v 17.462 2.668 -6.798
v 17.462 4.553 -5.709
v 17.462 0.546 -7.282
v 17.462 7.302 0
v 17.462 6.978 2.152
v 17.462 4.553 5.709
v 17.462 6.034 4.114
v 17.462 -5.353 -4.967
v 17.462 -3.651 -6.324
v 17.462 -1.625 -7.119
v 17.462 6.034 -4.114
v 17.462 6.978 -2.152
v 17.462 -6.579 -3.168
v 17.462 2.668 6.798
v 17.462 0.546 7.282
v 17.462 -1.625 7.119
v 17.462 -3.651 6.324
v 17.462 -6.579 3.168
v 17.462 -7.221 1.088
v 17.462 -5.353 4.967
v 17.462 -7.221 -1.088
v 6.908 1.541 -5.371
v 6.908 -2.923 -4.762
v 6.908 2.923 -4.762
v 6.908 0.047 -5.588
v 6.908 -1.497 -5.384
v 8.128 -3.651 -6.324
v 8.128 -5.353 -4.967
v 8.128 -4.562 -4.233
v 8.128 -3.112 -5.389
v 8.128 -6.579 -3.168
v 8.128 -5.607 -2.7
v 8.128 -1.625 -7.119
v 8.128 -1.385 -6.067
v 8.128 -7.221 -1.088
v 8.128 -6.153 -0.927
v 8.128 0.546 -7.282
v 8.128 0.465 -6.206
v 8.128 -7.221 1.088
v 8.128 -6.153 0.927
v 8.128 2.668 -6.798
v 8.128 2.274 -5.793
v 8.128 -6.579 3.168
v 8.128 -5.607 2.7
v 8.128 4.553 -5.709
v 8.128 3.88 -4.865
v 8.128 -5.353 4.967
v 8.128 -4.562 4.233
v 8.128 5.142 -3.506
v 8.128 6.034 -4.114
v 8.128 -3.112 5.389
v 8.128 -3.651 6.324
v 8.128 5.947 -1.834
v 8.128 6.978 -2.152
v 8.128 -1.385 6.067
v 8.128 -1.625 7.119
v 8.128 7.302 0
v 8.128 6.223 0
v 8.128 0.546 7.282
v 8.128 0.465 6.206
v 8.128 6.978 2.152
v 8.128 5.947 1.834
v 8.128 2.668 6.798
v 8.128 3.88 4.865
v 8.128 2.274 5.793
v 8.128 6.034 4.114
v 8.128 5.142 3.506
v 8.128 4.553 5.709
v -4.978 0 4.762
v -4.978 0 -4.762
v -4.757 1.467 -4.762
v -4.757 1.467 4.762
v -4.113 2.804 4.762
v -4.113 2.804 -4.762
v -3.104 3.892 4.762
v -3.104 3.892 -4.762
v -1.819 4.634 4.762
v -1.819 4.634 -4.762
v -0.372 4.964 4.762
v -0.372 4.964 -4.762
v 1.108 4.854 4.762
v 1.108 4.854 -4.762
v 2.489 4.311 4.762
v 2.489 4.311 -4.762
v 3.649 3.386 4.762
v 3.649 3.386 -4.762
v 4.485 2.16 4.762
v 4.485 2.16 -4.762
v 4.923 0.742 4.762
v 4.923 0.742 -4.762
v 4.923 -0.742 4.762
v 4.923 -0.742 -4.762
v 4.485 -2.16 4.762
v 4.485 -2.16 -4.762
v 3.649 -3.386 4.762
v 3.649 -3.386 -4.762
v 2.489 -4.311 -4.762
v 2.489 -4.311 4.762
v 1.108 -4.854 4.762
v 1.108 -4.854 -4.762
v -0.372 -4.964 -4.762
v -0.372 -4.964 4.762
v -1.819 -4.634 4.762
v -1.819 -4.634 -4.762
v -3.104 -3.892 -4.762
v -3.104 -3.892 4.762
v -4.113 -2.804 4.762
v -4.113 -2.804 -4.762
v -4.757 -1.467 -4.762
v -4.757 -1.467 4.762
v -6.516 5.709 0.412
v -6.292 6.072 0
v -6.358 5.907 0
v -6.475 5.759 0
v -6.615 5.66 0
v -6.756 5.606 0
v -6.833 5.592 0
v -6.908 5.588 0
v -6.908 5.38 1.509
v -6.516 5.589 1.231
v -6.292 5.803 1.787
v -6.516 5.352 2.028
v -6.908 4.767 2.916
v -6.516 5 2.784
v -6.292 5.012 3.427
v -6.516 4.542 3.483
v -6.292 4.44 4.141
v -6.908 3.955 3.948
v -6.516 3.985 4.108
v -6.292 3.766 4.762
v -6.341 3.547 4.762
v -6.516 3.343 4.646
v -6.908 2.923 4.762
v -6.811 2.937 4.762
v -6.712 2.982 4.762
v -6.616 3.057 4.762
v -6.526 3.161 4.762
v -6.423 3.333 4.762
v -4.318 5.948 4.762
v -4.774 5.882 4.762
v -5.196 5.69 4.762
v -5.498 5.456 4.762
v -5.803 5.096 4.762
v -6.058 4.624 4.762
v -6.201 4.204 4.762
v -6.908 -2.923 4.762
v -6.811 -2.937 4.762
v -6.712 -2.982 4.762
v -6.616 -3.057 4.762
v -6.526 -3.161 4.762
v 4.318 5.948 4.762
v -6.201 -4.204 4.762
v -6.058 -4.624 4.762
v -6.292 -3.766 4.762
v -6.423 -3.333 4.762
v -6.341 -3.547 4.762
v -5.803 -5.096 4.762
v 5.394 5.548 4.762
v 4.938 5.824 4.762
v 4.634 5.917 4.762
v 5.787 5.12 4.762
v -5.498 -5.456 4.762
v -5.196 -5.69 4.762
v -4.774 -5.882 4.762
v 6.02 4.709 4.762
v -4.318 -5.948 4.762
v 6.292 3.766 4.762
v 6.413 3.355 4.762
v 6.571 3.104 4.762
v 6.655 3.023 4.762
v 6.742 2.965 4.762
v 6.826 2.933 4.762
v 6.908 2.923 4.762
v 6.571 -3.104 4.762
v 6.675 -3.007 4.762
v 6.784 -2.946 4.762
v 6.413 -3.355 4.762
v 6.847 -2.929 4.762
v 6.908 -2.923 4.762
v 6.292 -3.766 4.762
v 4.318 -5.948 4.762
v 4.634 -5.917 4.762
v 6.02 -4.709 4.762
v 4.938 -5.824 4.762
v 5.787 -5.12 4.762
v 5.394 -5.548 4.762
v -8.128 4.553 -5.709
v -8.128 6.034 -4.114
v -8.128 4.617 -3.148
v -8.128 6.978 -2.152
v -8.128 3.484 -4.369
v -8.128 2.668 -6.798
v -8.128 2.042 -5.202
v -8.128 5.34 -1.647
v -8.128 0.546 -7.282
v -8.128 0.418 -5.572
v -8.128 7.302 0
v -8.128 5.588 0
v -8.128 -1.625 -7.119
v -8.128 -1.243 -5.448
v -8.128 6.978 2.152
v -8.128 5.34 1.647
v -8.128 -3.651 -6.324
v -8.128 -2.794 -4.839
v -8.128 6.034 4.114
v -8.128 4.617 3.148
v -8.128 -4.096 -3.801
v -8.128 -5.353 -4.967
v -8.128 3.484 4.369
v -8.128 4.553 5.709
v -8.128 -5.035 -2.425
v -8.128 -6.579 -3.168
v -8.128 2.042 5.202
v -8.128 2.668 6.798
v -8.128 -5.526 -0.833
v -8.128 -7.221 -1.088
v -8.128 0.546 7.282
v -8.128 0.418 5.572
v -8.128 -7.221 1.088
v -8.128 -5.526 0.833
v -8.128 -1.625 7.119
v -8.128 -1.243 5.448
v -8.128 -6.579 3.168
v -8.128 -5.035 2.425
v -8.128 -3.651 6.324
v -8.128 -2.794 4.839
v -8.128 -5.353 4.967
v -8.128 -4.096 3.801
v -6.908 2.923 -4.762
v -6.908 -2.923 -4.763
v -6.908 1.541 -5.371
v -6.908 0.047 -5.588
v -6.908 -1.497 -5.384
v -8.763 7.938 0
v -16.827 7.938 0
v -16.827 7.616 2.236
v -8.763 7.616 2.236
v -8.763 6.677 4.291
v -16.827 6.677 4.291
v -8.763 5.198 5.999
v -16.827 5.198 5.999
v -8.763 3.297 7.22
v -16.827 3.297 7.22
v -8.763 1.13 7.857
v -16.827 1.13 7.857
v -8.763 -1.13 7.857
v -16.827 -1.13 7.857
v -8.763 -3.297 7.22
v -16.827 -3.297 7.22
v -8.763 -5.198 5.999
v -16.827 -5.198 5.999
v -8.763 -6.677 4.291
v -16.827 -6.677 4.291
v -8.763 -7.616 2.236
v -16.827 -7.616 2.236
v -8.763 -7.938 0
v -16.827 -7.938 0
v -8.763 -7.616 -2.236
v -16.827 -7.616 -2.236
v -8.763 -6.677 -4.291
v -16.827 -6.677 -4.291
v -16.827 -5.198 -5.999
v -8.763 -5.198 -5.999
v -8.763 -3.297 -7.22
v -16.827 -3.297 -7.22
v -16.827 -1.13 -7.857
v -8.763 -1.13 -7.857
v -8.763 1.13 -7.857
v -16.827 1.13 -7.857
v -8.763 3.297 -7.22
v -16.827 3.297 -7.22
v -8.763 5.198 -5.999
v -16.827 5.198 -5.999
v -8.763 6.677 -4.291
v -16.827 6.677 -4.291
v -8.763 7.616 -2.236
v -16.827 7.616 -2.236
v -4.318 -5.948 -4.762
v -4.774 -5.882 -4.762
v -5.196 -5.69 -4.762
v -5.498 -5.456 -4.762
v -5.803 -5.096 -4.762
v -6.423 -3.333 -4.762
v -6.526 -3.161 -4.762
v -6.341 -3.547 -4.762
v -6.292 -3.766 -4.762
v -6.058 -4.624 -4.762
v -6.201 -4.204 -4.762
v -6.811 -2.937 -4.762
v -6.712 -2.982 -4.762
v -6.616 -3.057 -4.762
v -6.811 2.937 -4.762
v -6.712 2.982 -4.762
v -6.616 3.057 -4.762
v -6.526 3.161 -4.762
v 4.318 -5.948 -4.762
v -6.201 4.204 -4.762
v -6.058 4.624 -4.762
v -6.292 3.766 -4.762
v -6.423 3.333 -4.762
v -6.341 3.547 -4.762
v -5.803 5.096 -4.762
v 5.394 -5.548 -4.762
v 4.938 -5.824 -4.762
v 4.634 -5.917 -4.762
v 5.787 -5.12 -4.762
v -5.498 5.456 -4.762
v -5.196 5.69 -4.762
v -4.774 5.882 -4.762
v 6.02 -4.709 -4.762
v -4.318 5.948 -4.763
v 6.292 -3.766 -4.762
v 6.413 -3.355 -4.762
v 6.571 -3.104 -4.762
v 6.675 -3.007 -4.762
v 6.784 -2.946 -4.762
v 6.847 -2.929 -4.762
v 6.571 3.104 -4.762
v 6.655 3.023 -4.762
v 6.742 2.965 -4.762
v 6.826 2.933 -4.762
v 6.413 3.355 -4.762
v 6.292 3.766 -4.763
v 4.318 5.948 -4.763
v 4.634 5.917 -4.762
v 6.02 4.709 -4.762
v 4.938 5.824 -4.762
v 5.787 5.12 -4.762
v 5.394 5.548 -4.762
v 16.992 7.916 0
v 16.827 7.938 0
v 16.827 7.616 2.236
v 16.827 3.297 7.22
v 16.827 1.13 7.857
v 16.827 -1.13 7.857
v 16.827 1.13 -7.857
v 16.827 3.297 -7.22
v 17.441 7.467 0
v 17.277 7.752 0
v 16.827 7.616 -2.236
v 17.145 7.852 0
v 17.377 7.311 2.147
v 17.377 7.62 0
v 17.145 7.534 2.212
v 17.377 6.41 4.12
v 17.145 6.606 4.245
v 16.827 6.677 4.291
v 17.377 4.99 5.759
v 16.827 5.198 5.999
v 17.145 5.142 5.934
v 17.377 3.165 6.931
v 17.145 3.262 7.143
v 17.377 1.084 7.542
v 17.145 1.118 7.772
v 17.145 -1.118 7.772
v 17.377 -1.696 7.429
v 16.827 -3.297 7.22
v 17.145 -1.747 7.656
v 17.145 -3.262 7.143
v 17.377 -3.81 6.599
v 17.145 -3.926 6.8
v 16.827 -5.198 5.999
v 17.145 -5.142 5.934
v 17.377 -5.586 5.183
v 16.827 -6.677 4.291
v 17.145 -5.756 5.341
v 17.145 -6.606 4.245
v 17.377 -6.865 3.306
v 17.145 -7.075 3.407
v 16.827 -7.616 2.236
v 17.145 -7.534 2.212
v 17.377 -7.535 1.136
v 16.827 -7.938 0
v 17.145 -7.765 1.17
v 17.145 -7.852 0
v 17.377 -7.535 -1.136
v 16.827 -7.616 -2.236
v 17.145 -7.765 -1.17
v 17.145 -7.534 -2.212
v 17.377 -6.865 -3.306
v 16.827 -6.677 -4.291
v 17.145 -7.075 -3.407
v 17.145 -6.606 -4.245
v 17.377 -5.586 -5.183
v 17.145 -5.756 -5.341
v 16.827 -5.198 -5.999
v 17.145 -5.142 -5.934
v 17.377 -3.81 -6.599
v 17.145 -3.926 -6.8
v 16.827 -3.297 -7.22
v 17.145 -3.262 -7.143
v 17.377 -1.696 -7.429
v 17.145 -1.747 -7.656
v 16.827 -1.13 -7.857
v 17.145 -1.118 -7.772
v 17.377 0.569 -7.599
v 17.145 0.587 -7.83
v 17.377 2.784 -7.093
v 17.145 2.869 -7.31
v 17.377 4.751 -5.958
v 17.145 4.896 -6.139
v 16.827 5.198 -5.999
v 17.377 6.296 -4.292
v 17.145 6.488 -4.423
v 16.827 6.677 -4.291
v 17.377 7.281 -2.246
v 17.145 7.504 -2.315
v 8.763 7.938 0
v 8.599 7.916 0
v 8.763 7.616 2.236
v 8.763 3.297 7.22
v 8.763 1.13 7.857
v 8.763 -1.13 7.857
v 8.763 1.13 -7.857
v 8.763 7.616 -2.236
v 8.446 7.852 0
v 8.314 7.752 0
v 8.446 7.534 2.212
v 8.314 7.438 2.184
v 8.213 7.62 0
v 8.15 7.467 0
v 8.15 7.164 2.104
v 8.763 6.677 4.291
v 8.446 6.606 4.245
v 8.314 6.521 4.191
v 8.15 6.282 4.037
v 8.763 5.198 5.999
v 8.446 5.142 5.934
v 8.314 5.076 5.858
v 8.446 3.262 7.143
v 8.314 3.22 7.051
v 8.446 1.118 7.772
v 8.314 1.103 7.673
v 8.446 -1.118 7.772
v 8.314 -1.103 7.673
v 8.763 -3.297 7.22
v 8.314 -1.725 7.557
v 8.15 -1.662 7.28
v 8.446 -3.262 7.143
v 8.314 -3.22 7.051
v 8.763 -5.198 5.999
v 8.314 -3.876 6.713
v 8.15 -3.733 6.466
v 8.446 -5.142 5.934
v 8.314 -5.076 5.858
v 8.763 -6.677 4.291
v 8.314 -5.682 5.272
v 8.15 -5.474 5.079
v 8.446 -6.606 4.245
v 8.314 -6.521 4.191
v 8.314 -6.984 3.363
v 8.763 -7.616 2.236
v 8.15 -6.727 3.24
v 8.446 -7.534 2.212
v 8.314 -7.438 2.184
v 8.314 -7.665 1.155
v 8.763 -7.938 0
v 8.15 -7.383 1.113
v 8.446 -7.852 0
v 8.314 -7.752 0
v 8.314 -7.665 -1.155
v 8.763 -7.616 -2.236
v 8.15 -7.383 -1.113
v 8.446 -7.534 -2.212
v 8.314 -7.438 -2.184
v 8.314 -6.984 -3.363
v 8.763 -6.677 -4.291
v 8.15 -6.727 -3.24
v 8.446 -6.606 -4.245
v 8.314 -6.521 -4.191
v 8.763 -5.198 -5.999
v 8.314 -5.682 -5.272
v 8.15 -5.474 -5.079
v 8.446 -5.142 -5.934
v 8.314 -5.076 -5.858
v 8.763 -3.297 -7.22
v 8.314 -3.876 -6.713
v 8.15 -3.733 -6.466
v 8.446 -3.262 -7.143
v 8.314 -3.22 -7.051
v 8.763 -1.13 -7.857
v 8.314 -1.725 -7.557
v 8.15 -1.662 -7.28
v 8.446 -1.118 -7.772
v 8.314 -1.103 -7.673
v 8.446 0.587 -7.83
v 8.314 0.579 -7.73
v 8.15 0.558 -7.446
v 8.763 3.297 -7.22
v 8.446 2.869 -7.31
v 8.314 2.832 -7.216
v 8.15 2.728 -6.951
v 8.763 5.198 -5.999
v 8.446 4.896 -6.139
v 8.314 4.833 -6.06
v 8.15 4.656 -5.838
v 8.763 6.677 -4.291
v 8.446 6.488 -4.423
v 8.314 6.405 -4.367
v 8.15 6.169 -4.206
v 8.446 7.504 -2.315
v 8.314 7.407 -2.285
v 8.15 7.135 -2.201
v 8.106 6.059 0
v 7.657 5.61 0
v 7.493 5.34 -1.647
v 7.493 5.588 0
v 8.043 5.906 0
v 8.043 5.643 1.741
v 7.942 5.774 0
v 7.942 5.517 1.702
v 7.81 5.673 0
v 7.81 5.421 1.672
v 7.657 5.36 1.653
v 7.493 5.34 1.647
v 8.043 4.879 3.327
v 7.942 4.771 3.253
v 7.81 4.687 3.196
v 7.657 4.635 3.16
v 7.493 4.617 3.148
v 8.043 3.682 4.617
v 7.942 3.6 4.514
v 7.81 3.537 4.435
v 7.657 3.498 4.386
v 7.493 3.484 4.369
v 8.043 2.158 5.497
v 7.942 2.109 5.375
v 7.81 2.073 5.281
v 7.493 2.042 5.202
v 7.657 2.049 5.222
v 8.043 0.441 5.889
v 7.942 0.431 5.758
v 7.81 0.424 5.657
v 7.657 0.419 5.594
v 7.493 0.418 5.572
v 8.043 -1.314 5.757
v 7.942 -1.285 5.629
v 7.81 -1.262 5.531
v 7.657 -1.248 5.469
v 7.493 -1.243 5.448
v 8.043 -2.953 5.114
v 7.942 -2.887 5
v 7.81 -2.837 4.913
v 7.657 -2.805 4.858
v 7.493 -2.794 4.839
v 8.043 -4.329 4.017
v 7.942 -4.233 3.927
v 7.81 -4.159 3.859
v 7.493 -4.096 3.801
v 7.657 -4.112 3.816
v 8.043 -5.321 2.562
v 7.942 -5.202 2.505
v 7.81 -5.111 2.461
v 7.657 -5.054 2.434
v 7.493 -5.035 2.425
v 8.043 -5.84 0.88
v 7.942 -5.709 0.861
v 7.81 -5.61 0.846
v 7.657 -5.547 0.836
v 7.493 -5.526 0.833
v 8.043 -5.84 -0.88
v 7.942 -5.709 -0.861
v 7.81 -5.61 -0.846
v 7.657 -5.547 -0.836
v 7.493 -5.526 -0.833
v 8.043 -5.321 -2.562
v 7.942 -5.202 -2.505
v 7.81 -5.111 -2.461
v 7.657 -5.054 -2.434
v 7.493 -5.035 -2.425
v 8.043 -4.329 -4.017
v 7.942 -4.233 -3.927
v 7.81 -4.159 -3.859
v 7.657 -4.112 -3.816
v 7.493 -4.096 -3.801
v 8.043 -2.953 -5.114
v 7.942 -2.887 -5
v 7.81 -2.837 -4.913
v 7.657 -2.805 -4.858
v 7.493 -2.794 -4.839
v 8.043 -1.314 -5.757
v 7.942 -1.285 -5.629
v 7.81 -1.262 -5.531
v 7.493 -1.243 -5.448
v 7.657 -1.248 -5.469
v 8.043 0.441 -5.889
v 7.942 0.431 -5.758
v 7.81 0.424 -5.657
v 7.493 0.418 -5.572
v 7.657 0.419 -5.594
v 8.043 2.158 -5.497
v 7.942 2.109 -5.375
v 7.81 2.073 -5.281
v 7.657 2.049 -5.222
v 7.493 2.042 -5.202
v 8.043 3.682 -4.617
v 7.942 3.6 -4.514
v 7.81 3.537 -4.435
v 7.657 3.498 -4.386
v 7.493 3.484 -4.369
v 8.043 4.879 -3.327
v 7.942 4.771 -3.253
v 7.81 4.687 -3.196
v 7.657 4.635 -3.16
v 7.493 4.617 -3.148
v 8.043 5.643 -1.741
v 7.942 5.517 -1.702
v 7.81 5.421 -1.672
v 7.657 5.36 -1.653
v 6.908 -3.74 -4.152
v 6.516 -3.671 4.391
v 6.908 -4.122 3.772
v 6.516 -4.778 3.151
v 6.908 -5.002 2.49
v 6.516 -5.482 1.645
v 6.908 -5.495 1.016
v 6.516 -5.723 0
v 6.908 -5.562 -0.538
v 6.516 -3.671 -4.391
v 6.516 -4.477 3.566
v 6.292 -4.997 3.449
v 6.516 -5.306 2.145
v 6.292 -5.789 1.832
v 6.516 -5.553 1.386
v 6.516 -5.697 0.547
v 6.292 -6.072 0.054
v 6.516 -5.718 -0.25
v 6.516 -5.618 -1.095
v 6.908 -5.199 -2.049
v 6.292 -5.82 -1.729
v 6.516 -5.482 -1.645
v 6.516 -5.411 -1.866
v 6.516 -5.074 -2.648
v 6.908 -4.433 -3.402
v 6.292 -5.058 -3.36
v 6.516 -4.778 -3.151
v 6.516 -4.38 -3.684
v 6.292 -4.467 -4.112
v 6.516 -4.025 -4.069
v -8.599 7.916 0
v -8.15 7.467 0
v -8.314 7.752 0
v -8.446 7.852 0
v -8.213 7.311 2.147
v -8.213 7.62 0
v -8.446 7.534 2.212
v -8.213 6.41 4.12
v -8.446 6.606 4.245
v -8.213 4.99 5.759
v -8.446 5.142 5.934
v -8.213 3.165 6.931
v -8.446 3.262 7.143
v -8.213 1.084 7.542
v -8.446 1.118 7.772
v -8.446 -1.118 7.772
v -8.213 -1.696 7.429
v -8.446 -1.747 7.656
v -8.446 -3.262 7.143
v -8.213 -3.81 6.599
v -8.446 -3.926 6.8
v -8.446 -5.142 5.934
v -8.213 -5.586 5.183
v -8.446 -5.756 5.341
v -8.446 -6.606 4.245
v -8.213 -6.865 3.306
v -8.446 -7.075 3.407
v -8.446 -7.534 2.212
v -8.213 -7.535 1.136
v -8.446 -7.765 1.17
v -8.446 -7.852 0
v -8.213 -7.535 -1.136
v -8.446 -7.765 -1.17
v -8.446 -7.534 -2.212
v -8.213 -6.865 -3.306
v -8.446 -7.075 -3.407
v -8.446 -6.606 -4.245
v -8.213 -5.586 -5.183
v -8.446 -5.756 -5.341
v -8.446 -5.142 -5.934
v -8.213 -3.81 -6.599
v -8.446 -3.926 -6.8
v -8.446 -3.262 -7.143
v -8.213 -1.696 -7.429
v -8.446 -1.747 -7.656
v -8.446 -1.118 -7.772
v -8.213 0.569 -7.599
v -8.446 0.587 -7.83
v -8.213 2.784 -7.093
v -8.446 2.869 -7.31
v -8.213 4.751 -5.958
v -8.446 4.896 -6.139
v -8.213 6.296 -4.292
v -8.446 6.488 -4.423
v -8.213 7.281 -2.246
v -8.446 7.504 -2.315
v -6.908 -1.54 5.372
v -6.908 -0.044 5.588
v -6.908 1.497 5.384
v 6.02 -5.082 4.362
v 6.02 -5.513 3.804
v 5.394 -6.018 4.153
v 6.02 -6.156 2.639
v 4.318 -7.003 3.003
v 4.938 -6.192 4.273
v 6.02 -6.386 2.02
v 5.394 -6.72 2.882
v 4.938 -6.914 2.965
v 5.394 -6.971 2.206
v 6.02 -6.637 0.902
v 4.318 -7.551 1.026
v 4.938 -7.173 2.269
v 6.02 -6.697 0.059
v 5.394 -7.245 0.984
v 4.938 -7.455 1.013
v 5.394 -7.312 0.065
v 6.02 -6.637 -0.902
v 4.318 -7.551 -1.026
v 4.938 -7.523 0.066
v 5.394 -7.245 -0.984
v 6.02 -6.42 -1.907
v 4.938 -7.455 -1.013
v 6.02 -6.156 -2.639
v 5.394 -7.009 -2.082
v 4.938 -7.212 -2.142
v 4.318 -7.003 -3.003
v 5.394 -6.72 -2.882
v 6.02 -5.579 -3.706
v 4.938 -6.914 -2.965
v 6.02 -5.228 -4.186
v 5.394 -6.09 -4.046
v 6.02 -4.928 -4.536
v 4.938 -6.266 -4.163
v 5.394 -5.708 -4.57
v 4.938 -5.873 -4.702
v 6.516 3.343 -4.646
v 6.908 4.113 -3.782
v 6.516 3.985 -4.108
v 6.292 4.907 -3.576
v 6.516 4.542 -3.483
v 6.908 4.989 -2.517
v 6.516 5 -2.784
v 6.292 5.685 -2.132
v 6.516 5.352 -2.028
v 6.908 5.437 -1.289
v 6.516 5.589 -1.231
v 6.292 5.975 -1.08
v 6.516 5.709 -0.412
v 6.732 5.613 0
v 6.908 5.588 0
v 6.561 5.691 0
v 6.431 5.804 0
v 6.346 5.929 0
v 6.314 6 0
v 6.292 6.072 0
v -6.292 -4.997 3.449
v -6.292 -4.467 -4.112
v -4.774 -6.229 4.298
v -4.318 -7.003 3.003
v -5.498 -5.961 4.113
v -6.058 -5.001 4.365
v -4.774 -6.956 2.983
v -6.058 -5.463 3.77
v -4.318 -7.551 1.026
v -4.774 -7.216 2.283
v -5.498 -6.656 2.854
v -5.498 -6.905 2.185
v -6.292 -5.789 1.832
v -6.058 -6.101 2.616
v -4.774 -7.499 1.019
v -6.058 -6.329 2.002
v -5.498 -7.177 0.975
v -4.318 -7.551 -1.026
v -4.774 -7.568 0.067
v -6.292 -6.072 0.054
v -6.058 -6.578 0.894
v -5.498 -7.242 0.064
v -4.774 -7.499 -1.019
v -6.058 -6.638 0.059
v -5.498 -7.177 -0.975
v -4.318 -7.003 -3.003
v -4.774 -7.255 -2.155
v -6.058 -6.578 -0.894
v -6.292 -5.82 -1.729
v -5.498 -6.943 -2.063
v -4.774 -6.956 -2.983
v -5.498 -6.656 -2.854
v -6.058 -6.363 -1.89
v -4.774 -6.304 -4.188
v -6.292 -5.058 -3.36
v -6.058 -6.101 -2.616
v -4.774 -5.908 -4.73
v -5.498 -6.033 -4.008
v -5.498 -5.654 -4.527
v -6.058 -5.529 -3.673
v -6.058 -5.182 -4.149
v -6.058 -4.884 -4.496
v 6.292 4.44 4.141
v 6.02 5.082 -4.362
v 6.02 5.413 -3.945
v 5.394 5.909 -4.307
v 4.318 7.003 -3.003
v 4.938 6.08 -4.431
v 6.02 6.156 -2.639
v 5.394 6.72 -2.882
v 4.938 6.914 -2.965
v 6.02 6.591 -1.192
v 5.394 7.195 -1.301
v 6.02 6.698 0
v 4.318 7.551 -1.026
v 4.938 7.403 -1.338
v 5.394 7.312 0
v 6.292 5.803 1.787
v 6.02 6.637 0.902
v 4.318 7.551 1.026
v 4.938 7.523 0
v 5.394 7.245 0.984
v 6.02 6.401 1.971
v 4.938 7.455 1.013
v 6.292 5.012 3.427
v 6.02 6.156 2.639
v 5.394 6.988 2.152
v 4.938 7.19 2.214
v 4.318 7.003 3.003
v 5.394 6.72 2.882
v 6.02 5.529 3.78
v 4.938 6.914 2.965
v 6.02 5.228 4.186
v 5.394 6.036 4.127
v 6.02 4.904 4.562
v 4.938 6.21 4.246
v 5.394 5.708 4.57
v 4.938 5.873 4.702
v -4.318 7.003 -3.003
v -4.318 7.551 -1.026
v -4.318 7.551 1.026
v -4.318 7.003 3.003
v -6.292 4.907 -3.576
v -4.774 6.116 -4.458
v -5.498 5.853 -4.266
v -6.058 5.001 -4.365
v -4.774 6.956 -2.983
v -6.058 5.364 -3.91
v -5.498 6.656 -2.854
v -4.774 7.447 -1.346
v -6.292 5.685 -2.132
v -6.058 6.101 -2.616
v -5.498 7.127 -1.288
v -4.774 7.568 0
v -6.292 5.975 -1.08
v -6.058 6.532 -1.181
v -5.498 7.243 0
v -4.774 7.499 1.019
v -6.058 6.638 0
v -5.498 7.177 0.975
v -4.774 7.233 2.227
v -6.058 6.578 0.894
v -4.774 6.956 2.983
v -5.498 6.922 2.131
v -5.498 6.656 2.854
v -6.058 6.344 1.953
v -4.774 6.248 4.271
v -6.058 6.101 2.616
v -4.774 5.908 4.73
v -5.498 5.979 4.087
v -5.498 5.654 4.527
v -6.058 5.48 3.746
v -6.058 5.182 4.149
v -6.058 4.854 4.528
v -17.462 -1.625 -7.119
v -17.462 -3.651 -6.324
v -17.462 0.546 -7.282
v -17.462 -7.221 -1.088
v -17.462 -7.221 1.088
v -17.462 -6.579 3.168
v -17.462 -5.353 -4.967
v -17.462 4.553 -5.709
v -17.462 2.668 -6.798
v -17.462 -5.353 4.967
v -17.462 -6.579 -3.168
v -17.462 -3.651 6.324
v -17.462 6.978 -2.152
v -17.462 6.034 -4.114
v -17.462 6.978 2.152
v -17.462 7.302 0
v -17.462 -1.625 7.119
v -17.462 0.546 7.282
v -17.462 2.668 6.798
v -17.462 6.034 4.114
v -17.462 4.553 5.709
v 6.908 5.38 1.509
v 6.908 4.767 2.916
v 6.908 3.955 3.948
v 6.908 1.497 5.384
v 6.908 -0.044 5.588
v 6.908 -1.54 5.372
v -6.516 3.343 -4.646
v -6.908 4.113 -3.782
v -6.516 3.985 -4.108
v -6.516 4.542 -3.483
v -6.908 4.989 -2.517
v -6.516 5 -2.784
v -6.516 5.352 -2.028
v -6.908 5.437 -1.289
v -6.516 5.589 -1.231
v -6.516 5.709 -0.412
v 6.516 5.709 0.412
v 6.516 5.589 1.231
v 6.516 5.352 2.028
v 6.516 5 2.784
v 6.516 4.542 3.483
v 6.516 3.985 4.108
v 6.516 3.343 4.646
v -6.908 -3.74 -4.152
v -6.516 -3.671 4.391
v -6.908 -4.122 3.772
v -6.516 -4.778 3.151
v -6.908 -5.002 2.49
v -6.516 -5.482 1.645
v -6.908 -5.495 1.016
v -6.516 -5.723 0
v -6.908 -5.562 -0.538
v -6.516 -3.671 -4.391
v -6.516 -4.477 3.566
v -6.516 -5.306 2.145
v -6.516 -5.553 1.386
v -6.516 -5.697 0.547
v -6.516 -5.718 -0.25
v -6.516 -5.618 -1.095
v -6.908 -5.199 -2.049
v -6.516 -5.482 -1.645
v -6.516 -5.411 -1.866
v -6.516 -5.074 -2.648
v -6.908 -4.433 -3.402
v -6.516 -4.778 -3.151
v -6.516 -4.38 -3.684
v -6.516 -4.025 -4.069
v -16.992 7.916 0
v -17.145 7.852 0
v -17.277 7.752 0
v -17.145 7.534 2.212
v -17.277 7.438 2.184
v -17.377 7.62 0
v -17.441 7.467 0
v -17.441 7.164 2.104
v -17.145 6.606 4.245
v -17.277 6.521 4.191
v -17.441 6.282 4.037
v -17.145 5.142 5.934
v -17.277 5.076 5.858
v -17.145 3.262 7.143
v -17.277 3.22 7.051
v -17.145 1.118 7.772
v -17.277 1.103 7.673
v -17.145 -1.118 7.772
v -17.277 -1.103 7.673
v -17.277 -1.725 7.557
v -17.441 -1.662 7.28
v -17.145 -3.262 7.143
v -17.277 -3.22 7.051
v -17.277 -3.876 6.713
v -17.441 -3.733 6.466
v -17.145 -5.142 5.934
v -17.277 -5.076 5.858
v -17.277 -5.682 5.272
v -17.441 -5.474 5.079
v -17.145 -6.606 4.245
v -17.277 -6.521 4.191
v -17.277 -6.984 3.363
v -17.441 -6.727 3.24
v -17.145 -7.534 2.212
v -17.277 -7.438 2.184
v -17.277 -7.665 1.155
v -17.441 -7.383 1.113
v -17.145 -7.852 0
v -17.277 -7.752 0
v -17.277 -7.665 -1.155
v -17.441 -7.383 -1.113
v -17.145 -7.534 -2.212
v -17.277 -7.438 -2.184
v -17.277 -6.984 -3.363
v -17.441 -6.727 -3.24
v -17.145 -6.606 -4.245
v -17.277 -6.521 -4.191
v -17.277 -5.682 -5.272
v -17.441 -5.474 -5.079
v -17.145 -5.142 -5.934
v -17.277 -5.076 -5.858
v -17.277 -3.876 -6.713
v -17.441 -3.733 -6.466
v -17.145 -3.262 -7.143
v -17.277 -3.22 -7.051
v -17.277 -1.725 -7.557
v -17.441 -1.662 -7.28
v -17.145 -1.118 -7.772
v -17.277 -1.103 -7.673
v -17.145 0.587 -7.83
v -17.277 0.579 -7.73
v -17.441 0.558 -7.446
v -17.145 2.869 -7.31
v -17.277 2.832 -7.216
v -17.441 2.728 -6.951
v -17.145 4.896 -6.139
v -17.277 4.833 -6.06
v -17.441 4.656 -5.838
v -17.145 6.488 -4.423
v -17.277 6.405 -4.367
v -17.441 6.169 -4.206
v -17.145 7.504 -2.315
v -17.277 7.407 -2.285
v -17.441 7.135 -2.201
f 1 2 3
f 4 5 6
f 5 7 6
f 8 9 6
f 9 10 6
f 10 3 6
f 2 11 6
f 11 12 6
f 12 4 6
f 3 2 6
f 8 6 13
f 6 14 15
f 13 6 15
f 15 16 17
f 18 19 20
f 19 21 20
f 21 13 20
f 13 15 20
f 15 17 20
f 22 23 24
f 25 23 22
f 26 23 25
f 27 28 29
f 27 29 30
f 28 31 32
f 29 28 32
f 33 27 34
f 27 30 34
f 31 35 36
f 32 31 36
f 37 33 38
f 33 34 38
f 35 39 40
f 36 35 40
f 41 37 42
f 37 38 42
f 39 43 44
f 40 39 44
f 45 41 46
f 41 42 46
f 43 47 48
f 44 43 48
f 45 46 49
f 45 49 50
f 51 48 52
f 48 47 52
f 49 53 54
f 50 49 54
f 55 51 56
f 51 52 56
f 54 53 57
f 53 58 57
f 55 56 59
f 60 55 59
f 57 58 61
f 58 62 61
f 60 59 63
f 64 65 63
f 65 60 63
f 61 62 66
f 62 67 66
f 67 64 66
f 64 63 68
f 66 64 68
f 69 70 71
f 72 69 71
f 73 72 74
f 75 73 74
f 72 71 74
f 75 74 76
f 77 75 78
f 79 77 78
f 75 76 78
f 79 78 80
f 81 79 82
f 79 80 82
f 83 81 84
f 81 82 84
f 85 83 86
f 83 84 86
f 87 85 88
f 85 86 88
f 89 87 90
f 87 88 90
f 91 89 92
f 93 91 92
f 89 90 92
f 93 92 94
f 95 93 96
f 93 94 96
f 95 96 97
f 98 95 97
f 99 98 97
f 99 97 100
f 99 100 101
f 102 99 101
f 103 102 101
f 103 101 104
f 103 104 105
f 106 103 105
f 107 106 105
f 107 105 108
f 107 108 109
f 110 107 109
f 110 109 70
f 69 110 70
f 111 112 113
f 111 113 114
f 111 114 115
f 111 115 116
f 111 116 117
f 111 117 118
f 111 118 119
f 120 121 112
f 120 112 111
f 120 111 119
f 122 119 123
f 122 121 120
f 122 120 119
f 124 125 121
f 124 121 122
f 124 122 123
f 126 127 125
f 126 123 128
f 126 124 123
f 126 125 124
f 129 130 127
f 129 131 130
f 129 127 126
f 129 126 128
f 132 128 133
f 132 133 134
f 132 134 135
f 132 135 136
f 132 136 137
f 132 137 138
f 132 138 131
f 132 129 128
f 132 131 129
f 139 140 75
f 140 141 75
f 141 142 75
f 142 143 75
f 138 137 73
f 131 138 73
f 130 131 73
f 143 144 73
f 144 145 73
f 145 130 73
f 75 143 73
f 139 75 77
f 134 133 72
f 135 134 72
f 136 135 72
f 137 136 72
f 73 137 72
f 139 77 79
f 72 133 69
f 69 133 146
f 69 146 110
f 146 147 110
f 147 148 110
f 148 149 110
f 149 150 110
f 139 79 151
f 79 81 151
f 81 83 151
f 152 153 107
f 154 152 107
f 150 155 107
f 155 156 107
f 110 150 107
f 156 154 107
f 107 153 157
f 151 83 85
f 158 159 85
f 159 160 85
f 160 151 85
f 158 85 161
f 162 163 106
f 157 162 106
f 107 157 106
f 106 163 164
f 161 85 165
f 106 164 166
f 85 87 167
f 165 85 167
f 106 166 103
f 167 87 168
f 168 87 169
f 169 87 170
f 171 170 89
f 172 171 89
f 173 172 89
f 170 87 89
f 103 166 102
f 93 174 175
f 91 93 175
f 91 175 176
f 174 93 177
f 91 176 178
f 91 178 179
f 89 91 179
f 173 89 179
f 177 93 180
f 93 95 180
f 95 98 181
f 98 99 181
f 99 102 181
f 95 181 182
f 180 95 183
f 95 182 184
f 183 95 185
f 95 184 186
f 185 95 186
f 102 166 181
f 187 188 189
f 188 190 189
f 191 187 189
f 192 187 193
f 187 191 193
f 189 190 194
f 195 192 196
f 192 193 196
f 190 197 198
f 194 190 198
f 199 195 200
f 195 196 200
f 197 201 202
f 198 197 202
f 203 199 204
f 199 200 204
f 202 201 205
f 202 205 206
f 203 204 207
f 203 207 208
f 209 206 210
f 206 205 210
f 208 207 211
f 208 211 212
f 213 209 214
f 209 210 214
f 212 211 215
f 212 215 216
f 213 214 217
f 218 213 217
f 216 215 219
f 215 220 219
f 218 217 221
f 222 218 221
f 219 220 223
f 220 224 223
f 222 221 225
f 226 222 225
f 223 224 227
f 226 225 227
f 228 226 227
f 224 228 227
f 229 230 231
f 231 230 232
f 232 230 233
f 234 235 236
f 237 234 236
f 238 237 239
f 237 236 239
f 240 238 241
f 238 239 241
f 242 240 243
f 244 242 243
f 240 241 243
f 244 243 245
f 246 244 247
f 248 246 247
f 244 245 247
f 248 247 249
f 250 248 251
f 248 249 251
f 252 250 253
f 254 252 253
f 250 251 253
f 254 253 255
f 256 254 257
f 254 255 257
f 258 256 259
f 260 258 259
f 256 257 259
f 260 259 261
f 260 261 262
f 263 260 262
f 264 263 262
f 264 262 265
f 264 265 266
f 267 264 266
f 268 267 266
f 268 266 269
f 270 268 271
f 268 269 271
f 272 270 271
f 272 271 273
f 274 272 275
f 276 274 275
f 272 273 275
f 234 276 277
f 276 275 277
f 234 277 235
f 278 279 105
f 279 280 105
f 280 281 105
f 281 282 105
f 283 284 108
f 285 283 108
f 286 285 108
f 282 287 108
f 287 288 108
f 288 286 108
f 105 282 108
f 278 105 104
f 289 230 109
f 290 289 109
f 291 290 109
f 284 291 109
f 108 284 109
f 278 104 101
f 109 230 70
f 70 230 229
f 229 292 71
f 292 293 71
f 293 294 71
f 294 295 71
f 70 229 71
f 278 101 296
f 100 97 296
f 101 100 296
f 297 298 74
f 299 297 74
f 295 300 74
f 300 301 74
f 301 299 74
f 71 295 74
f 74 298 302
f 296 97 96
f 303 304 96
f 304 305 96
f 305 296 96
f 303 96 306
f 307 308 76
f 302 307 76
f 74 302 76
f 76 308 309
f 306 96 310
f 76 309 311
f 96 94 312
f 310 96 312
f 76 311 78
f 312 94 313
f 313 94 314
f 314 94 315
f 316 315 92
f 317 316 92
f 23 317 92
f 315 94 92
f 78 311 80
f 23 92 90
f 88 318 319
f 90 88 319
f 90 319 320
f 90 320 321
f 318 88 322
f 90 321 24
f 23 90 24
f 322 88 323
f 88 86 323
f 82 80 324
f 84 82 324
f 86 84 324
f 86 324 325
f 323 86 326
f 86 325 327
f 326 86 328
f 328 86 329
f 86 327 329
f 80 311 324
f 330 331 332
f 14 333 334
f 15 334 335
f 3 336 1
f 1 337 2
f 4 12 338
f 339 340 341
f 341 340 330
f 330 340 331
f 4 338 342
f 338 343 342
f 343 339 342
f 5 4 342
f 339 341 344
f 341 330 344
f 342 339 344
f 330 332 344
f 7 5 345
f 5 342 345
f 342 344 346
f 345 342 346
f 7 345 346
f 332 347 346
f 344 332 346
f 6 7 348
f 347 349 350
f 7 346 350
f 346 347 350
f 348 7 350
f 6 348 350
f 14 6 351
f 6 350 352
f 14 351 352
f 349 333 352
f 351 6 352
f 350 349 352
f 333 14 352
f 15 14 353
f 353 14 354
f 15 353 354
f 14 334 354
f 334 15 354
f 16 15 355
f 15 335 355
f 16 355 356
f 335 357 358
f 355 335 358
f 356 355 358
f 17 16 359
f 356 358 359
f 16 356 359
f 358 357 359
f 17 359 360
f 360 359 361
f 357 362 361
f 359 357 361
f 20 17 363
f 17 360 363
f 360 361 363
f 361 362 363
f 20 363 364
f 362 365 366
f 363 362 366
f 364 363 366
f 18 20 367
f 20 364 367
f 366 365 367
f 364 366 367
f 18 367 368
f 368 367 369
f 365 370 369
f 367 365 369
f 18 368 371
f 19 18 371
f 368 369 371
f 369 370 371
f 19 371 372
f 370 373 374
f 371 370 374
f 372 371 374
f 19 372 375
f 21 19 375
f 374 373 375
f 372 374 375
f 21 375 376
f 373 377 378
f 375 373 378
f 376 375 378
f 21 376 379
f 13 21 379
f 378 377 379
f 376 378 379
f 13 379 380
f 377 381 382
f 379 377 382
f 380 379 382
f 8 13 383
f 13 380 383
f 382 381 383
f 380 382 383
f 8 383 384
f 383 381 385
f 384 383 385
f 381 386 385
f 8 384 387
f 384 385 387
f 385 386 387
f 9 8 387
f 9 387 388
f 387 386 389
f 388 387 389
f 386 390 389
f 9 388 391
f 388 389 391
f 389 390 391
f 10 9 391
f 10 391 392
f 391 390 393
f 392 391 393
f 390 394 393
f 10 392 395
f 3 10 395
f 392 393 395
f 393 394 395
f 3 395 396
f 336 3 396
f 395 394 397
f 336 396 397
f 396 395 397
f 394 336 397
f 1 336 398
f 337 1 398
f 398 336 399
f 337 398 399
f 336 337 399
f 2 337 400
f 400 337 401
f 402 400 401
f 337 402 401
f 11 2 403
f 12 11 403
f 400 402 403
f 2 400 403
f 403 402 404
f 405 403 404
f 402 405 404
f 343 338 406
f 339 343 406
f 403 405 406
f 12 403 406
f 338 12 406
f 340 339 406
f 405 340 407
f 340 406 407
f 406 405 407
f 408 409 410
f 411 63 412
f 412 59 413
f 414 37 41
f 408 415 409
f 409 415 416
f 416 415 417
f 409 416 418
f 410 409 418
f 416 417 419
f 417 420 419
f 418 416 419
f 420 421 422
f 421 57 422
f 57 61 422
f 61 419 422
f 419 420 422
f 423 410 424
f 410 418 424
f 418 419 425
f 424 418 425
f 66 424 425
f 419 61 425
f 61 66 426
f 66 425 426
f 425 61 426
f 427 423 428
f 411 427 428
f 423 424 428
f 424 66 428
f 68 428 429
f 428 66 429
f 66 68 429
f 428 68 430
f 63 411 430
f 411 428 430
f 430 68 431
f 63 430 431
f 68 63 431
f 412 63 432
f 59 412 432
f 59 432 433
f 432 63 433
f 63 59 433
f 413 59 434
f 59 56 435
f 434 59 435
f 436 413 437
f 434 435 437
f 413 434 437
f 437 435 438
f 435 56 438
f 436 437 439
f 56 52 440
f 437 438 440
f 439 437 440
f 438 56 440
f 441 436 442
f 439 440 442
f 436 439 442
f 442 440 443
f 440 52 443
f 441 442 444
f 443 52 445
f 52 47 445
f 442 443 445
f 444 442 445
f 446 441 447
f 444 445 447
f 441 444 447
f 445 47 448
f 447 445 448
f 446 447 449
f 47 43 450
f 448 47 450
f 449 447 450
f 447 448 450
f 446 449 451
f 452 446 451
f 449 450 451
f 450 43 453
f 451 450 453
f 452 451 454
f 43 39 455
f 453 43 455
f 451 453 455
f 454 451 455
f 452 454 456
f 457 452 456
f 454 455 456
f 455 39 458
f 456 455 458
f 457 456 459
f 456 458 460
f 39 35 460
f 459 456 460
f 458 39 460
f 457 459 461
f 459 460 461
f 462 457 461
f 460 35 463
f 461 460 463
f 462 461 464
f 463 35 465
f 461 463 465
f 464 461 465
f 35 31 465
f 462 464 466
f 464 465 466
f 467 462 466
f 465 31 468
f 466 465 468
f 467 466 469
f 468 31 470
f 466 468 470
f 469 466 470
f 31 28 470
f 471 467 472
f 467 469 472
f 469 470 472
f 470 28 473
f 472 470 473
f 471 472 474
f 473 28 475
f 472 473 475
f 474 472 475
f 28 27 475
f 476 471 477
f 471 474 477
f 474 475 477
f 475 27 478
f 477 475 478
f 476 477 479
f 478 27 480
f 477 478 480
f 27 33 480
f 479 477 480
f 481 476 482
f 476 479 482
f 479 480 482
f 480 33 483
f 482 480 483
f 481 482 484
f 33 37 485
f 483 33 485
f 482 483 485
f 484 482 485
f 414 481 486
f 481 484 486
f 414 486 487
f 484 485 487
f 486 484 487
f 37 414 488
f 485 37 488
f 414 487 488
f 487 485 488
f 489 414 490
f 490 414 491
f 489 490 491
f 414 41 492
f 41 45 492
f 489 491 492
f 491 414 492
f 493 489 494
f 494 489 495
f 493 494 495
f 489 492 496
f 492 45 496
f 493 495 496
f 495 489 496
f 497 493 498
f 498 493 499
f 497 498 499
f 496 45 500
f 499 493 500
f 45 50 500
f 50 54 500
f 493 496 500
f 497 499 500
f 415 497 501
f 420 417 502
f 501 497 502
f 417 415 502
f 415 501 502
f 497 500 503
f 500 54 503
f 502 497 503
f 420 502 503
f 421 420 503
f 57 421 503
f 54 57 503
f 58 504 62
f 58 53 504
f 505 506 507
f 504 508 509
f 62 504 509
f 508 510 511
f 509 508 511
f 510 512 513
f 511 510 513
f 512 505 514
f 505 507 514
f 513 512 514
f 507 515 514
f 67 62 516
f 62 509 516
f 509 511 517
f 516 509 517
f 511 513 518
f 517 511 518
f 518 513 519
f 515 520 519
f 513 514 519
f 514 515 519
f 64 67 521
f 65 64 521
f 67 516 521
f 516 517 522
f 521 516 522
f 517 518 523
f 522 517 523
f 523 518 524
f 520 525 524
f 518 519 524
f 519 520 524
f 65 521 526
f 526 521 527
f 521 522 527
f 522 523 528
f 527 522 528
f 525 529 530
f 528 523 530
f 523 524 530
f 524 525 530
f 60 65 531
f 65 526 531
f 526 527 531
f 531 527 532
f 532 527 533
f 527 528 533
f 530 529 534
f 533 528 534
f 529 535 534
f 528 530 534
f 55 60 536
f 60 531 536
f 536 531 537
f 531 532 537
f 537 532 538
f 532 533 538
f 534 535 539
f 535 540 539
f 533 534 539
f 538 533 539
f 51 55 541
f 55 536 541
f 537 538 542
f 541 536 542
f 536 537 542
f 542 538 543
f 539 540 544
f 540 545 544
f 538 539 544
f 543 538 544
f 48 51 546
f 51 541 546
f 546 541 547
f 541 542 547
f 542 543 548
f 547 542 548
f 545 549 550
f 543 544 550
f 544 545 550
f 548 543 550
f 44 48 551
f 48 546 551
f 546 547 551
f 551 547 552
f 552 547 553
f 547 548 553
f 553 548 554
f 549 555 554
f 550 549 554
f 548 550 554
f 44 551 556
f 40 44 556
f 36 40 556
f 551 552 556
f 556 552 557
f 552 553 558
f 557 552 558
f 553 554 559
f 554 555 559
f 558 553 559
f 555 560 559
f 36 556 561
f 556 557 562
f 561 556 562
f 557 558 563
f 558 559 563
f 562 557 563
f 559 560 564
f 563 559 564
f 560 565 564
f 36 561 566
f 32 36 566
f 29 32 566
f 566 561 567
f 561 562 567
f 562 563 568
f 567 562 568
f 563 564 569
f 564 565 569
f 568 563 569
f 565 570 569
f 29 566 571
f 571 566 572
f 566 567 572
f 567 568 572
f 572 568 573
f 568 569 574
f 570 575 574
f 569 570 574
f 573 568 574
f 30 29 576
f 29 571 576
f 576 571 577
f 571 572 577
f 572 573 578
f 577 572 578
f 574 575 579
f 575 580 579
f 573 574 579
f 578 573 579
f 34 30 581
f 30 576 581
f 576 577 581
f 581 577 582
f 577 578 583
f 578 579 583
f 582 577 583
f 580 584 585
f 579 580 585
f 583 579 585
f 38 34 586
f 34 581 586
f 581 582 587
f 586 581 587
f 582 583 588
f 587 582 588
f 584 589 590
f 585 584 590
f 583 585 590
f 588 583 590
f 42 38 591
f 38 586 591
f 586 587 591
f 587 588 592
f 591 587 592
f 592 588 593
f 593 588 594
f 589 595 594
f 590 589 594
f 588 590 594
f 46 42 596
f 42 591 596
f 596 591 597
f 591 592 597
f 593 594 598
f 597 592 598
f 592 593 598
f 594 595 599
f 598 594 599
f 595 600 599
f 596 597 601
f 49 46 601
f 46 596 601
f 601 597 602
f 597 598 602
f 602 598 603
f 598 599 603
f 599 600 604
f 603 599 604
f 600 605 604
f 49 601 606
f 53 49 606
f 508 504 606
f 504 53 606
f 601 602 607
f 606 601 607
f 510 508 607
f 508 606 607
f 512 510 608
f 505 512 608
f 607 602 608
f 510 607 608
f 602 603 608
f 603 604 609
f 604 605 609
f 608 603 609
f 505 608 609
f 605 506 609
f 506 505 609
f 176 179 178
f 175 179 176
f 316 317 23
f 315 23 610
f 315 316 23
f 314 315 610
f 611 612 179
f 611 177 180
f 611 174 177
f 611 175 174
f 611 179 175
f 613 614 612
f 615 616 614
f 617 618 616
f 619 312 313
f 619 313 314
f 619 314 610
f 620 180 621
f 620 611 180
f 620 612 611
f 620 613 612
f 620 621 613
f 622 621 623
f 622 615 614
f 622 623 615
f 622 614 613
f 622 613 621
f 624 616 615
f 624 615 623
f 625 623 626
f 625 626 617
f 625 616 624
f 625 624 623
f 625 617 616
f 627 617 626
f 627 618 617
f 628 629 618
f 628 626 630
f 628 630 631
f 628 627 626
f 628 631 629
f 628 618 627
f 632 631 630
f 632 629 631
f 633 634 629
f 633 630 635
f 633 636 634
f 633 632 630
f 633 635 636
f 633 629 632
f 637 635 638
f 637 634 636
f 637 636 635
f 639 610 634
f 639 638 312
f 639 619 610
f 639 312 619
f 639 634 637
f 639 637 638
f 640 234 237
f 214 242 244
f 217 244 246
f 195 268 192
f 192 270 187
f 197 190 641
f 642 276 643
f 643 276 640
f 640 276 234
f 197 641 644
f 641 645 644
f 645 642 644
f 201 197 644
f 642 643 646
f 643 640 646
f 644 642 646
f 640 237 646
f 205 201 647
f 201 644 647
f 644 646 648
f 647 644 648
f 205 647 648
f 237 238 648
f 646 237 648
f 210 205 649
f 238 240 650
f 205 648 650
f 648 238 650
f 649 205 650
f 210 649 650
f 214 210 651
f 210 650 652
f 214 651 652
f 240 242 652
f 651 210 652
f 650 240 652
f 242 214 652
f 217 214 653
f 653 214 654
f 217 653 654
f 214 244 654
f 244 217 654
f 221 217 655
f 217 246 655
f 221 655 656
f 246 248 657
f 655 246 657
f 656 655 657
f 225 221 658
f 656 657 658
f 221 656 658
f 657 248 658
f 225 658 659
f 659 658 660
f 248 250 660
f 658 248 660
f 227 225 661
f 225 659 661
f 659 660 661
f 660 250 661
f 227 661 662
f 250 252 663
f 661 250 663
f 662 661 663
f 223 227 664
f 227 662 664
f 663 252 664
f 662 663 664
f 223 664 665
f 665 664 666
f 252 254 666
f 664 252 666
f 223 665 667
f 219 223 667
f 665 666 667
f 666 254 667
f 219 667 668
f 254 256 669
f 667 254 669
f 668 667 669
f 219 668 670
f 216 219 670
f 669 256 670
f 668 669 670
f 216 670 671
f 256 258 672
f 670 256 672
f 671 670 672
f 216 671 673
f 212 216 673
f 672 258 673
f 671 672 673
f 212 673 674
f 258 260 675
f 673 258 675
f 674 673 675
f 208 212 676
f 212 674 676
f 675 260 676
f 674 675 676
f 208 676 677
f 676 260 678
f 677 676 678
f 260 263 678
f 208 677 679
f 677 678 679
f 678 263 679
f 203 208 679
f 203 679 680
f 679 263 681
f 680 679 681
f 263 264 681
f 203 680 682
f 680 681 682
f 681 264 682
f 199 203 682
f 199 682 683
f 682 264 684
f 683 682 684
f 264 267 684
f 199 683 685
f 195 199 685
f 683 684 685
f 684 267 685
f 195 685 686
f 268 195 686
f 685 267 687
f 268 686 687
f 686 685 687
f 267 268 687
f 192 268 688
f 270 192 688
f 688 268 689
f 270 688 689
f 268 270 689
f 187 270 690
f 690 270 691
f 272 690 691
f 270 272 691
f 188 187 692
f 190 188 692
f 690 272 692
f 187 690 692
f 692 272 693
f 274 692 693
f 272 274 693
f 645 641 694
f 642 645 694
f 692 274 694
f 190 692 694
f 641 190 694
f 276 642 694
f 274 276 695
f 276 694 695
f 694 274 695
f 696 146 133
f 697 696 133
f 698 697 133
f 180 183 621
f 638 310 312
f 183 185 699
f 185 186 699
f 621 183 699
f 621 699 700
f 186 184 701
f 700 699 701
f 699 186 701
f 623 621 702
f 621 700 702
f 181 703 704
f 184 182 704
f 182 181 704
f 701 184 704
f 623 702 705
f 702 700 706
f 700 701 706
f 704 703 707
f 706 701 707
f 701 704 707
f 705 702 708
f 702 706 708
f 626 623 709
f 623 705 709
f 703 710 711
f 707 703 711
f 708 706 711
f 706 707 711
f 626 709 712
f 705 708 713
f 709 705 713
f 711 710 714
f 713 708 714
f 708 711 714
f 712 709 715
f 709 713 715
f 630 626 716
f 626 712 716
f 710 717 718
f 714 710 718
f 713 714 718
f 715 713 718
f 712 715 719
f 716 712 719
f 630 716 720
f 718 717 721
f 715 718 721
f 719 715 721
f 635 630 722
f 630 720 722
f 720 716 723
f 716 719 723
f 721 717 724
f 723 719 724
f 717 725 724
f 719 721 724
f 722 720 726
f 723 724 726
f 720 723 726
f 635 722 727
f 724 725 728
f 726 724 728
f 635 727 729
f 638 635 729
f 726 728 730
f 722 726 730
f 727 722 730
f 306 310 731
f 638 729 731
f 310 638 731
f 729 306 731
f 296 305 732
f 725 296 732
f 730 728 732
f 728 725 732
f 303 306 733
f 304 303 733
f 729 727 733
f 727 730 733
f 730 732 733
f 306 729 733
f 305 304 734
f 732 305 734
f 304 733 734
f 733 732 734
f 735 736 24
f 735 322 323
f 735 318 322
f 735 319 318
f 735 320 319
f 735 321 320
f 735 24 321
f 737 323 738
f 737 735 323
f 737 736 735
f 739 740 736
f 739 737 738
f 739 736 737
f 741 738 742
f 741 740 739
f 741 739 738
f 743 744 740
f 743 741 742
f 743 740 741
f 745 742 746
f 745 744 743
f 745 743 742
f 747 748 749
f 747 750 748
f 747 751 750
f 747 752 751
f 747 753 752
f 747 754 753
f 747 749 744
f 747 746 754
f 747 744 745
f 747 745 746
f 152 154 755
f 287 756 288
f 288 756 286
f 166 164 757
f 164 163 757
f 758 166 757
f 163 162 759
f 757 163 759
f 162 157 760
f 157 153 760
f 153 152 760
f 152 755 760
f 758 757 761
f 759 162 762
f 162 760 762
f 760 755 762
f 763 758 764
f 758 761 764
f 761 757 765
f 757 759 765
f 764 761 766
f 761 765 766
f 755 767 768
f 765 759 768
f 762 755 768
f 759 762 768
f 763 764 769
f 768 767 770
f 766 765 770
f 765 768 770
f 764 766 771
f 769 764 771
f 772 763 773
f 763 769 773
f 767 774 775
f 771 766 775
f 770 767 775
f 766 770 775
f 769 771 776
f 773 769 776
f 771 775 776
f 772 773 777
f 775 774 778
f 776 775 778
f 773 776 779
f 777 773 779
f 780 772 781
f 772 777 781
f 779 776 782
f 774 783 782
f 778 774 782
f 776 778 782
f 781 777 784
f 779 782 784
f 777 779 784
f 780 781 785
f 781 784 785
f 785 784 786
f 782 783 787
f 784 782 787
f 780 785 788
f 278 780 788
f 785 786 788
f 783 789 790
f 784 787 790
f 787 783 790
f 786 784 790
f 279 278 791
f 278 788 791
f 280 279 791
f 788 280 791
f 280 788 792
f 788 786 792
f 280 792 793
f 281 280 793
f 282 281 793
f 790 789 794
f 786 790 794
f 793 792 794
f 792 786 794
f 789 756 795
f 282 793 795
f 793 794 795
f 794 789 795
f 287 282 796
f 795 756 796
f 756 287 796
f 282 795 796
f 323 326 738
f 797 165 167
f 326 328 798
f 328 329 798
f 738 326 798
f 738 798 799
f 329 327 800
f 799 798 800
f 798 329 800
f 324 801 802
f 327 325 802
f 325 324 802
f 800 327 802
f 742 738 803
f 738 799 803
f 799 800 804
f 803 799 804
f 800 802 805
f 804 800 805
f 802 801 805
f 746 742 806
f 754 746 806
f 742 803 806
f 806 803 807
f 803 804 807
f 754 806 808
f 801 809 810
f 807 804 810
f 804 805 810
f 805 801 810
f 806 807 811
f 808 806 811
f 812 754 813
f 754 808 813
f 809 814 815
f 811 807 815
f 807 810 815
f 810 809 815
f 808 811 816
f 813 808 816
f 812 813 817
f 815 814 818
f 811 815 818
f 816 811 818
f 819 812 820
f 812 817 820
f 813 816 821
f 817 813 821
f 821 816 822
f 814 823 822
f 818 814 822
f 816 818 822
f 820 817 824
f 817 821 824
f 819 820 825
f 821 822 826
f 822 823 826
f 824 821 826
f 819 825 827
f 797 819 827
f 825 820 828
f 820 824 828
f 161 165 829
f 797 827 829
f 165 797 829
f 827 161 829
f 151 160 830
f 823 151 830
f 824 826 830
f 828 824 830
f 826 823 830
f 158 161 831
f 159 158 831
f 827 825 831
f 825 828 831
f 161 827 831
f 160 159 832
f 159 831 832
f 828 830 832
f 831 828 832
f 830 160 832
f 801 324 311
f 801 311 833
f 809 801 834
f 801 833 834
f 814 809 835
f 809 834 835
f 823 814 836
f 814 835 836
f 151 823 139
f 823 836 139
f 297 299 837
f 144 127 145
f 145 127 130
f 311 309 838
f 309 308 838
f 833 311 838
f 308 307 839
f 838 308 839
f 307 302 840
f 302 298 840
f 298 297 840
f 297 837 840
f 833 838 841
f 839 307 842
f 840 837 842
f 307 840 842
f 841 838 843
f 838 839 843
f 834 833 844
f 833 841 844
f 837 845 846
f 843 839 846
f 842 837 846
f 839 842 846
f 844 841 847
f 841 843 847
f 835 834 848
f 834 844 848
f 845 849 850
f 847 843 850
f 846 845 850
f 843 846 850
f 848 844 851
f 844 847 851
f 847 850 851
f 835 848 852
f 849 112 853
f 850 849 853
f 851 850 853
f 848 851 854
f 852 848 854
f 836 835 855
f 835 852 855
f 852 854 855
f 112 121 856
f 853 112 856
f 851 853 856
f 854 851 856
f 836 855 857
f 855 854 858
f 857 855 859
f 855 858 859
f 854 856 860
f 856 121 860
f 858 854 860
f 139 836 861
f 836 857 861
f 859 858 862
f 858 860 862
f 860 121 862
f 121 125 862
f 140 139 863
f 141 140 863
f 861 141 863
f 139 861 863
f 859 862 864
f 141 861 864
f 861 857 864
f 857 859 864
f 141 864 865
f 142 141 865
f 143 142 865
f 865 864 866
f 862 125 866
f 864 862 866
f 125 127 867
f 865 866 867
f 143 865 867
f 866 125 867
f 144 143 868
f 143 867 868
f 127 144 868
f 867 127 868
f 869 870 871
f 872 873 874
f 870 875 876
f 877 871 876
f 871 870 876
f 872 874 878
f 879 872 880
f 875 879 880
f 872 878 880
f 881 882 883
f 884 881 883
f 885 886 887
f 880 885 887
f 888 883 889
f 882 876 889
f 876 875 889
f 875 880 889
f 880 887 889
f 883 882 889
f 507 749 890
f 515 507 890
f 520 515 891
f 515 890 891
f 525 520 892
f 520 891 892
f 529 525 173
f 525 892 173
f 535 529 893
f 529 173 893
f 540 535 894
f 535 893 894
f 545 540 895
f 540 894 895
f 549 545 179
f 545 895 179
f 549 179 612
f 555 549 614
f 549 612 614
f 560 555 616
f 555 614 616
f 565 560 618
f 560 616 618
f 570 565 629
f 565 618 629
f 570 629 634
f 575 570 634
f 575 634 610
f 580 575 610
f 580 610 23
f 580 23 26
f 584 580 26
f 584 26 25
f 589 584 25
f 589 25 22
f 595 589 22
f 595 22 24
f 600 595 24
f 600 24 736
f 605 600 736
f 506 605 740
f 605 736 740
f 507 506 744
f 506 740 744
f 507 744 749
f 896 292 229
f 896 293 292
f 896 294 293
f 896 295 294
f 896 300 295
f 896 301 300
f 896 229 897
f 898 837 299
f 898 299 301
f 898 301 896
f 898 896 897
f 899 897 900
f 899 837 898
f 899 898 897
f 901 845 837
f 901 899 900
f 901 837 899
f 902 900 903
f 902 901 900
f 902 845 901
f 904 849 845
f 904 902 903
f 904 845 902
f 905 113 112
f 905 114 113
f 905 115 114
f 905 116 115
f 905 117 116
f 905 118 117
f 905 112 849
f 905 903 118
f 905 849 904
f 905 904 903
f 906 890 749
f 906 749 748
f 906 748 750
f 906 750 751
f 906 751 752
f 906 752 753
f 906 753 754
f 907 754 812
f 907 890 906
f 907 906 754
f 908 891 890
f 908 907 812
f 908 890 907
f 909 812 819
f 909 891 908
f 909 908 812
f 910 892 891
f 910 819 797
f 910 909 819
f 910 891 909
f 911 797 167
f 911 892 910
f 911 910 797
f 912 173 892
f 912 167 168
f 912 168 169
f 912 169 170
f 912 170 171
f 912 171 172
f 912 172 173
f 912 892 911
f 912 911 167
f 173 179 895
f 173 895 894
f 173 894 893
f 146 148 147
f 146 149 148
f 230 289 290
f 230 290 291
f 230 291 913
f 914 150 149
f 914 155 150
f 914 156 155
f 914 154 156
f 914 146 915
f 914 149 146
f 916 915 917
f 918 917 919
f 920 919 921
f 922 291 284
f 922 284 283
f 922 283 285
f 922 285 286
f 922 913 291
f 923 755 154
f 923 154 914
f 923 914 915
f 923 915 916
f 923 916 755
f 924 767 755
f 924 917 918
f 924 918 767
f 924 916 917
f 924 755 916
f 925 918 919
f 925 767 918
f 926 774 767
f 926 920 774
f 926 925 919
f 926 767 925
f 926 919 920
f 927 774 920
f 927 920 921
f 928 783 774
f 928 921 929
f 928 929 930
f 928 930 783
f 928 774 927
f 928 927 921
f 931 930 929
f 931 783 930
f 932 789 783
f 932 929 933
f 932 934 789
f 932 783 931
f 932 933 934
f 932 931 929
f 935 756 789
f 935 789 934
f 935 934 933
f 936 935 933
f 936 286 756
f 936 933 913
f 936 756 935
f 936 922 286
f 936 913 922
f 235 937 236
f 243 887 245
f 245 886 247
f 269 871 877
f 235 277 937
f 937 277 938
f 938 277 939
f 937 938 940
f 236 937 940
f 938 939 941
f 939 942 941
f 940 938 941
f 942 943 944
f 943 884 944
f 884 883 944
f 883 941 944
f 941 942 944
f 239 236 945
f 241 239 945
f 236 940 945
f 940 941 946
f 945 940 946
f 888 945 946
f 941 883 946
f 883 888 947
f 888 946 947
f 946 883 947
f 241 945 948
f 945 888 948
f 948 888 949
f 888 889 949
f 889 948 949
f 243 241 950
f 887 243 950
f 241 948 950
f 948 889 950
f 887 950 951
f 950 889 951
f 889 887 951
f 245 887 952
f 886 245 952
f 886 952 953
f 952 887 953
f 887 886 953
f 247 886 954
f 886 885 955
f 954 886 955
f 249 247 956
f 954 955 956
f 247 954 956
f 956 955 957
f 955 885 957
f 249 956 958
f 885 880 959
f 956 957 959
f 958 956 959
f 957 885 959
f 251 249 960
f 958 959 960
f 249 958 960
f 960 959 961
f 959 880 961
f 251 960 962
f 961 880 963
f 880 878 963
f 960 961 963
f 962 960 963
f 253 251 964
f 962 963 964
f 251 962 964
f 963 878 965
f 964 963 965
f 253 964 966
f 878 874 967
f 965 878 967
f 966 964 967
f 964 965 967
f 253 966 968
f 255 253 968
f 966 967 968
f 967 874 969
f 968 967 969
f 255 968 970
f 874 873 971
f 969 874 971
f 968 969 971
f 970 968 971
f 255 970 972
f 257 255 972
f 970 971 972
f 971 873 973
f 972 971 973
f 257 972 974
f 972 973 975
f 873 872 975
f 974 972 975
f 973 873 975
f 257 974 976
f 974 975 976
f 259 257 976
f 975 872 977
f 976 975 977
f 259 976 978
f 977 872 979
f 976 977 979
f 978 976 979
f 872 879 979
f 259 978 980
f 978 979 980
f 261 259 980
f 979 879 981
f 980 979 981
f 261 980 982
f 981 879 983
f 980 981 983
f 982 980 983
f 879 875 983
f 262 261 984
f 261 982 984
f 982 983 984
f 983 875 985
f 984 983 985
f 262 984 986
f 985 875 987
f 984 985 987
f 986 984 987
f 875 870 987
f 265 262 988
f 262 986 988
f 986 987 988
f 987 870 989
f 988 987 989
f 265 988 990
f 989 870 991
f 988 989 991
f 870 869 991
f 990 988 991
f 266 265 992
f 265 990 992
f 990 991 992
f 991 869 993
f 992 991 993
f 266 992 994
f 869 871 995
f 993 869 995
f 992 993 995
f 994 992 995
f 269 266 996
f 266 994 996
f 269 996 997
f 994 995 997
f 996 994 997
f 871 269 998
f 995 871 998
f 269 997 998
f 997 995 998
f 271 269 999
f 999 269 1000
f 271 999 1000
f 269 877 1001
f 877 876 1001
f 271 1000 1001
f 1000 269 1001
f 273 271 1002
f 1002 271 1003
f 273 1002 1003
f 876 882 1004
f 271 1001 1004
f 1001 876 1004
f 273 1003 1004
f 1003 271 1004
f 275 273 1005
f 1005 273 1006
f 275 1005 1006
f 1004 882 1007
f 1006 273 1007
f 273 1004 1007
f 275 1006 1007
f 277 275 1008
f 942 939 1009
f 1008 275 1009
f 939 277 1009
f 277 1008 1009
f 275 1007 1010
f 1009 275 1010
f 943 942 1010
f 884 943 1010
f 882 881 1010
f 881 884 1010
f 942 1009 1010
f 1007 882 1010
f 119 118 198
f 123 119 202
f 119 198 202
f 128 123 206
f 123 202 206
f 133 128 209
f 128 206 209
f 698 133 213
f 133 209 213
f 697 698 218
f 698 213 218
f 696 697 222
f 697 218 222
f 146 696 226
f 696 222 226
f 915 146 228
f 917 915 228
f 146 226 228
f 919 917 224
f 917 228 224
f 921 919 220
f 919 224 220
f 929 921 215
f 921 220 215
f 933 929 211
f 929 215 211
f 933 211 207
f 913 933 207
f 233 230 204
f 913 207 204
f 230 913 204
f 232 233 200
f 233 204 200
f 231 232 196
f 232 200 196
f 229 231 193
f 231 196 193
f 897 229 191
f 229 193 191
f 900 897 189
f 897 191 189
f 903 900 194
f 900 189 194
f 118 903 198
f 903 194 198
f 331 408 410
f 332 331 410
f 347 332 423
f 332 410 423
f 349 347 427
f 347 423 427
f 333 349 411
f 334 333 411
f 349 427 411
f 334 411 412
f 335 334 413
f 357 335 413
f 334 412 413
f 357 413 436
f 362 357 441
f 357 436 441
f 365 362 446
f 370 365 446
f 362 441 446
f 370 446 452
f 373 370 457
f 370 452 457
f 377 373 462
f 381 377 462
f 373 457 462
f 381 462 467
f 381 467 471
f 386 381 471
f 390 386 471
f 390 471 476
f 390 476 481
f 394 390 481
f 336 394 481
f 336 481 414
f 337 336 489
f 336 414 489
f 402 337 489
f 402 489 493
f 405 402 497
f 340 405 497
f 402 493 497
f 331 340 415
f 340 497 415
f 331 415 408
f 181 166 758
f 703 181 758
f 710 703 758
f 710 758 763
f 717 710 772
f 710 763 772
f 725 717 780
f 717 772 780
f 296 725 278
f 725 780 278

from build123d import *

# Parameters (mm, degrees)
FILLET1_R               = 0.635
SKETCH2_W               = 13.816603826
SKETCH2_H               = 21.411090548
SKETCH2_H_2             = 20.268646053
CUT_EXTRUDE1_DEPTH      = 8.9375
CUT_EXTRUDE1_DEPTH_BACK = 8.9375
SKETCH3_R               = 4.9784
CUT_EXTRUDE2_DEPTH      = 13.7000001


with BuildPart() as part:
    # Sketch1 → Revolve1 (revolve)
    with BuildSketch(Plane.XY):
        with BuildLine():
            Line((-17.4625, 0), (17.4625, 0))
            Line((17.4625, 0), (17.4625, 7.9375))
            Line((17.4625, 7.9375), (8.128, 7.9375))
            Line((8.128, 7.9375), (8.128, 5.588))
            Line((8.128, 5.588), (6.35, 5.588))
            ThreePointArc((6.35, 5.588), (5.754840979, 7.024840979), (4.318, 7.62))
            Line((4.318, 7.62), (-4.318, 7.62))
            ThreePointArc((-4.318, 7.62), (-5.754840979, 7.024840979), (-6.35, 5.588))
            Line((-6.35, 5.588), (-8.128, 5.588))
            Line((-8.128, 5.588), (-8.128, 7.9375))
            Line((-8.128, 7.9375), (-17.4625, 7.9375))
            Line((-17.4625, 7.9375), (-17.4625, 0))
        make_face()
    revolve(axis=Axis((-34.611108151, 0, 0), (1, 0, 0)))

    # Fillet1
    fillet1_edges = [part.edges().sort_by_distance(p)[0] for p in [
        (6.35, -5.588, 0),
        (8.128, -5.588, 0),
        (8.128, -7.9375, 0),
        (17.4625, -7.9375, 0),
        (-17.4625, -7.9375, 0),
        (-8.128, -7.9375, 0),
        (-6.35, -5.588, 0),
    ]]
    fillet(fillet1_edges, radius=FILLET1_R)

    # Sketch2 → Cut-Extrude1 (cut, two sides)
    with BuildSketch(Plane(origin=(0, 0, 0), x_dir=(1, 0, 0), z_dir=(0, 1, 0))) as cut_extrude1_sk:
        with Locations((0, 15.468045274)):
            Rectangle(SKETCH2_W, SKETCH2_H)
        with Locations((0, -14.896823026)):
            Rectangle(SKETCH2_W, SKETCH2_H_2)
    extrude(amount=CUT_EXTRUDE1_DEPTH, mode=Mode.SUBTRACT)
    extrude(cut_extrude1_sk.sketch, amount=-CUT_EXTRUDE1_DEPTH_BACK, mode=Mode.SUBTRACT)

    # Sketch3 → Cut-Extrude2 (cut, through all)
    with BuildSketch(Plane(origin=(0, 0, -4.7625), x_dir=(-1, 0, 0), z_dir=(0, 0, -1))):
        Circle(SKETCH3_R)
    extrude(amount=-CUT_EXTRUDE2_DEPTH, mode=Mode.SUBTRACT)


solid = part.part
